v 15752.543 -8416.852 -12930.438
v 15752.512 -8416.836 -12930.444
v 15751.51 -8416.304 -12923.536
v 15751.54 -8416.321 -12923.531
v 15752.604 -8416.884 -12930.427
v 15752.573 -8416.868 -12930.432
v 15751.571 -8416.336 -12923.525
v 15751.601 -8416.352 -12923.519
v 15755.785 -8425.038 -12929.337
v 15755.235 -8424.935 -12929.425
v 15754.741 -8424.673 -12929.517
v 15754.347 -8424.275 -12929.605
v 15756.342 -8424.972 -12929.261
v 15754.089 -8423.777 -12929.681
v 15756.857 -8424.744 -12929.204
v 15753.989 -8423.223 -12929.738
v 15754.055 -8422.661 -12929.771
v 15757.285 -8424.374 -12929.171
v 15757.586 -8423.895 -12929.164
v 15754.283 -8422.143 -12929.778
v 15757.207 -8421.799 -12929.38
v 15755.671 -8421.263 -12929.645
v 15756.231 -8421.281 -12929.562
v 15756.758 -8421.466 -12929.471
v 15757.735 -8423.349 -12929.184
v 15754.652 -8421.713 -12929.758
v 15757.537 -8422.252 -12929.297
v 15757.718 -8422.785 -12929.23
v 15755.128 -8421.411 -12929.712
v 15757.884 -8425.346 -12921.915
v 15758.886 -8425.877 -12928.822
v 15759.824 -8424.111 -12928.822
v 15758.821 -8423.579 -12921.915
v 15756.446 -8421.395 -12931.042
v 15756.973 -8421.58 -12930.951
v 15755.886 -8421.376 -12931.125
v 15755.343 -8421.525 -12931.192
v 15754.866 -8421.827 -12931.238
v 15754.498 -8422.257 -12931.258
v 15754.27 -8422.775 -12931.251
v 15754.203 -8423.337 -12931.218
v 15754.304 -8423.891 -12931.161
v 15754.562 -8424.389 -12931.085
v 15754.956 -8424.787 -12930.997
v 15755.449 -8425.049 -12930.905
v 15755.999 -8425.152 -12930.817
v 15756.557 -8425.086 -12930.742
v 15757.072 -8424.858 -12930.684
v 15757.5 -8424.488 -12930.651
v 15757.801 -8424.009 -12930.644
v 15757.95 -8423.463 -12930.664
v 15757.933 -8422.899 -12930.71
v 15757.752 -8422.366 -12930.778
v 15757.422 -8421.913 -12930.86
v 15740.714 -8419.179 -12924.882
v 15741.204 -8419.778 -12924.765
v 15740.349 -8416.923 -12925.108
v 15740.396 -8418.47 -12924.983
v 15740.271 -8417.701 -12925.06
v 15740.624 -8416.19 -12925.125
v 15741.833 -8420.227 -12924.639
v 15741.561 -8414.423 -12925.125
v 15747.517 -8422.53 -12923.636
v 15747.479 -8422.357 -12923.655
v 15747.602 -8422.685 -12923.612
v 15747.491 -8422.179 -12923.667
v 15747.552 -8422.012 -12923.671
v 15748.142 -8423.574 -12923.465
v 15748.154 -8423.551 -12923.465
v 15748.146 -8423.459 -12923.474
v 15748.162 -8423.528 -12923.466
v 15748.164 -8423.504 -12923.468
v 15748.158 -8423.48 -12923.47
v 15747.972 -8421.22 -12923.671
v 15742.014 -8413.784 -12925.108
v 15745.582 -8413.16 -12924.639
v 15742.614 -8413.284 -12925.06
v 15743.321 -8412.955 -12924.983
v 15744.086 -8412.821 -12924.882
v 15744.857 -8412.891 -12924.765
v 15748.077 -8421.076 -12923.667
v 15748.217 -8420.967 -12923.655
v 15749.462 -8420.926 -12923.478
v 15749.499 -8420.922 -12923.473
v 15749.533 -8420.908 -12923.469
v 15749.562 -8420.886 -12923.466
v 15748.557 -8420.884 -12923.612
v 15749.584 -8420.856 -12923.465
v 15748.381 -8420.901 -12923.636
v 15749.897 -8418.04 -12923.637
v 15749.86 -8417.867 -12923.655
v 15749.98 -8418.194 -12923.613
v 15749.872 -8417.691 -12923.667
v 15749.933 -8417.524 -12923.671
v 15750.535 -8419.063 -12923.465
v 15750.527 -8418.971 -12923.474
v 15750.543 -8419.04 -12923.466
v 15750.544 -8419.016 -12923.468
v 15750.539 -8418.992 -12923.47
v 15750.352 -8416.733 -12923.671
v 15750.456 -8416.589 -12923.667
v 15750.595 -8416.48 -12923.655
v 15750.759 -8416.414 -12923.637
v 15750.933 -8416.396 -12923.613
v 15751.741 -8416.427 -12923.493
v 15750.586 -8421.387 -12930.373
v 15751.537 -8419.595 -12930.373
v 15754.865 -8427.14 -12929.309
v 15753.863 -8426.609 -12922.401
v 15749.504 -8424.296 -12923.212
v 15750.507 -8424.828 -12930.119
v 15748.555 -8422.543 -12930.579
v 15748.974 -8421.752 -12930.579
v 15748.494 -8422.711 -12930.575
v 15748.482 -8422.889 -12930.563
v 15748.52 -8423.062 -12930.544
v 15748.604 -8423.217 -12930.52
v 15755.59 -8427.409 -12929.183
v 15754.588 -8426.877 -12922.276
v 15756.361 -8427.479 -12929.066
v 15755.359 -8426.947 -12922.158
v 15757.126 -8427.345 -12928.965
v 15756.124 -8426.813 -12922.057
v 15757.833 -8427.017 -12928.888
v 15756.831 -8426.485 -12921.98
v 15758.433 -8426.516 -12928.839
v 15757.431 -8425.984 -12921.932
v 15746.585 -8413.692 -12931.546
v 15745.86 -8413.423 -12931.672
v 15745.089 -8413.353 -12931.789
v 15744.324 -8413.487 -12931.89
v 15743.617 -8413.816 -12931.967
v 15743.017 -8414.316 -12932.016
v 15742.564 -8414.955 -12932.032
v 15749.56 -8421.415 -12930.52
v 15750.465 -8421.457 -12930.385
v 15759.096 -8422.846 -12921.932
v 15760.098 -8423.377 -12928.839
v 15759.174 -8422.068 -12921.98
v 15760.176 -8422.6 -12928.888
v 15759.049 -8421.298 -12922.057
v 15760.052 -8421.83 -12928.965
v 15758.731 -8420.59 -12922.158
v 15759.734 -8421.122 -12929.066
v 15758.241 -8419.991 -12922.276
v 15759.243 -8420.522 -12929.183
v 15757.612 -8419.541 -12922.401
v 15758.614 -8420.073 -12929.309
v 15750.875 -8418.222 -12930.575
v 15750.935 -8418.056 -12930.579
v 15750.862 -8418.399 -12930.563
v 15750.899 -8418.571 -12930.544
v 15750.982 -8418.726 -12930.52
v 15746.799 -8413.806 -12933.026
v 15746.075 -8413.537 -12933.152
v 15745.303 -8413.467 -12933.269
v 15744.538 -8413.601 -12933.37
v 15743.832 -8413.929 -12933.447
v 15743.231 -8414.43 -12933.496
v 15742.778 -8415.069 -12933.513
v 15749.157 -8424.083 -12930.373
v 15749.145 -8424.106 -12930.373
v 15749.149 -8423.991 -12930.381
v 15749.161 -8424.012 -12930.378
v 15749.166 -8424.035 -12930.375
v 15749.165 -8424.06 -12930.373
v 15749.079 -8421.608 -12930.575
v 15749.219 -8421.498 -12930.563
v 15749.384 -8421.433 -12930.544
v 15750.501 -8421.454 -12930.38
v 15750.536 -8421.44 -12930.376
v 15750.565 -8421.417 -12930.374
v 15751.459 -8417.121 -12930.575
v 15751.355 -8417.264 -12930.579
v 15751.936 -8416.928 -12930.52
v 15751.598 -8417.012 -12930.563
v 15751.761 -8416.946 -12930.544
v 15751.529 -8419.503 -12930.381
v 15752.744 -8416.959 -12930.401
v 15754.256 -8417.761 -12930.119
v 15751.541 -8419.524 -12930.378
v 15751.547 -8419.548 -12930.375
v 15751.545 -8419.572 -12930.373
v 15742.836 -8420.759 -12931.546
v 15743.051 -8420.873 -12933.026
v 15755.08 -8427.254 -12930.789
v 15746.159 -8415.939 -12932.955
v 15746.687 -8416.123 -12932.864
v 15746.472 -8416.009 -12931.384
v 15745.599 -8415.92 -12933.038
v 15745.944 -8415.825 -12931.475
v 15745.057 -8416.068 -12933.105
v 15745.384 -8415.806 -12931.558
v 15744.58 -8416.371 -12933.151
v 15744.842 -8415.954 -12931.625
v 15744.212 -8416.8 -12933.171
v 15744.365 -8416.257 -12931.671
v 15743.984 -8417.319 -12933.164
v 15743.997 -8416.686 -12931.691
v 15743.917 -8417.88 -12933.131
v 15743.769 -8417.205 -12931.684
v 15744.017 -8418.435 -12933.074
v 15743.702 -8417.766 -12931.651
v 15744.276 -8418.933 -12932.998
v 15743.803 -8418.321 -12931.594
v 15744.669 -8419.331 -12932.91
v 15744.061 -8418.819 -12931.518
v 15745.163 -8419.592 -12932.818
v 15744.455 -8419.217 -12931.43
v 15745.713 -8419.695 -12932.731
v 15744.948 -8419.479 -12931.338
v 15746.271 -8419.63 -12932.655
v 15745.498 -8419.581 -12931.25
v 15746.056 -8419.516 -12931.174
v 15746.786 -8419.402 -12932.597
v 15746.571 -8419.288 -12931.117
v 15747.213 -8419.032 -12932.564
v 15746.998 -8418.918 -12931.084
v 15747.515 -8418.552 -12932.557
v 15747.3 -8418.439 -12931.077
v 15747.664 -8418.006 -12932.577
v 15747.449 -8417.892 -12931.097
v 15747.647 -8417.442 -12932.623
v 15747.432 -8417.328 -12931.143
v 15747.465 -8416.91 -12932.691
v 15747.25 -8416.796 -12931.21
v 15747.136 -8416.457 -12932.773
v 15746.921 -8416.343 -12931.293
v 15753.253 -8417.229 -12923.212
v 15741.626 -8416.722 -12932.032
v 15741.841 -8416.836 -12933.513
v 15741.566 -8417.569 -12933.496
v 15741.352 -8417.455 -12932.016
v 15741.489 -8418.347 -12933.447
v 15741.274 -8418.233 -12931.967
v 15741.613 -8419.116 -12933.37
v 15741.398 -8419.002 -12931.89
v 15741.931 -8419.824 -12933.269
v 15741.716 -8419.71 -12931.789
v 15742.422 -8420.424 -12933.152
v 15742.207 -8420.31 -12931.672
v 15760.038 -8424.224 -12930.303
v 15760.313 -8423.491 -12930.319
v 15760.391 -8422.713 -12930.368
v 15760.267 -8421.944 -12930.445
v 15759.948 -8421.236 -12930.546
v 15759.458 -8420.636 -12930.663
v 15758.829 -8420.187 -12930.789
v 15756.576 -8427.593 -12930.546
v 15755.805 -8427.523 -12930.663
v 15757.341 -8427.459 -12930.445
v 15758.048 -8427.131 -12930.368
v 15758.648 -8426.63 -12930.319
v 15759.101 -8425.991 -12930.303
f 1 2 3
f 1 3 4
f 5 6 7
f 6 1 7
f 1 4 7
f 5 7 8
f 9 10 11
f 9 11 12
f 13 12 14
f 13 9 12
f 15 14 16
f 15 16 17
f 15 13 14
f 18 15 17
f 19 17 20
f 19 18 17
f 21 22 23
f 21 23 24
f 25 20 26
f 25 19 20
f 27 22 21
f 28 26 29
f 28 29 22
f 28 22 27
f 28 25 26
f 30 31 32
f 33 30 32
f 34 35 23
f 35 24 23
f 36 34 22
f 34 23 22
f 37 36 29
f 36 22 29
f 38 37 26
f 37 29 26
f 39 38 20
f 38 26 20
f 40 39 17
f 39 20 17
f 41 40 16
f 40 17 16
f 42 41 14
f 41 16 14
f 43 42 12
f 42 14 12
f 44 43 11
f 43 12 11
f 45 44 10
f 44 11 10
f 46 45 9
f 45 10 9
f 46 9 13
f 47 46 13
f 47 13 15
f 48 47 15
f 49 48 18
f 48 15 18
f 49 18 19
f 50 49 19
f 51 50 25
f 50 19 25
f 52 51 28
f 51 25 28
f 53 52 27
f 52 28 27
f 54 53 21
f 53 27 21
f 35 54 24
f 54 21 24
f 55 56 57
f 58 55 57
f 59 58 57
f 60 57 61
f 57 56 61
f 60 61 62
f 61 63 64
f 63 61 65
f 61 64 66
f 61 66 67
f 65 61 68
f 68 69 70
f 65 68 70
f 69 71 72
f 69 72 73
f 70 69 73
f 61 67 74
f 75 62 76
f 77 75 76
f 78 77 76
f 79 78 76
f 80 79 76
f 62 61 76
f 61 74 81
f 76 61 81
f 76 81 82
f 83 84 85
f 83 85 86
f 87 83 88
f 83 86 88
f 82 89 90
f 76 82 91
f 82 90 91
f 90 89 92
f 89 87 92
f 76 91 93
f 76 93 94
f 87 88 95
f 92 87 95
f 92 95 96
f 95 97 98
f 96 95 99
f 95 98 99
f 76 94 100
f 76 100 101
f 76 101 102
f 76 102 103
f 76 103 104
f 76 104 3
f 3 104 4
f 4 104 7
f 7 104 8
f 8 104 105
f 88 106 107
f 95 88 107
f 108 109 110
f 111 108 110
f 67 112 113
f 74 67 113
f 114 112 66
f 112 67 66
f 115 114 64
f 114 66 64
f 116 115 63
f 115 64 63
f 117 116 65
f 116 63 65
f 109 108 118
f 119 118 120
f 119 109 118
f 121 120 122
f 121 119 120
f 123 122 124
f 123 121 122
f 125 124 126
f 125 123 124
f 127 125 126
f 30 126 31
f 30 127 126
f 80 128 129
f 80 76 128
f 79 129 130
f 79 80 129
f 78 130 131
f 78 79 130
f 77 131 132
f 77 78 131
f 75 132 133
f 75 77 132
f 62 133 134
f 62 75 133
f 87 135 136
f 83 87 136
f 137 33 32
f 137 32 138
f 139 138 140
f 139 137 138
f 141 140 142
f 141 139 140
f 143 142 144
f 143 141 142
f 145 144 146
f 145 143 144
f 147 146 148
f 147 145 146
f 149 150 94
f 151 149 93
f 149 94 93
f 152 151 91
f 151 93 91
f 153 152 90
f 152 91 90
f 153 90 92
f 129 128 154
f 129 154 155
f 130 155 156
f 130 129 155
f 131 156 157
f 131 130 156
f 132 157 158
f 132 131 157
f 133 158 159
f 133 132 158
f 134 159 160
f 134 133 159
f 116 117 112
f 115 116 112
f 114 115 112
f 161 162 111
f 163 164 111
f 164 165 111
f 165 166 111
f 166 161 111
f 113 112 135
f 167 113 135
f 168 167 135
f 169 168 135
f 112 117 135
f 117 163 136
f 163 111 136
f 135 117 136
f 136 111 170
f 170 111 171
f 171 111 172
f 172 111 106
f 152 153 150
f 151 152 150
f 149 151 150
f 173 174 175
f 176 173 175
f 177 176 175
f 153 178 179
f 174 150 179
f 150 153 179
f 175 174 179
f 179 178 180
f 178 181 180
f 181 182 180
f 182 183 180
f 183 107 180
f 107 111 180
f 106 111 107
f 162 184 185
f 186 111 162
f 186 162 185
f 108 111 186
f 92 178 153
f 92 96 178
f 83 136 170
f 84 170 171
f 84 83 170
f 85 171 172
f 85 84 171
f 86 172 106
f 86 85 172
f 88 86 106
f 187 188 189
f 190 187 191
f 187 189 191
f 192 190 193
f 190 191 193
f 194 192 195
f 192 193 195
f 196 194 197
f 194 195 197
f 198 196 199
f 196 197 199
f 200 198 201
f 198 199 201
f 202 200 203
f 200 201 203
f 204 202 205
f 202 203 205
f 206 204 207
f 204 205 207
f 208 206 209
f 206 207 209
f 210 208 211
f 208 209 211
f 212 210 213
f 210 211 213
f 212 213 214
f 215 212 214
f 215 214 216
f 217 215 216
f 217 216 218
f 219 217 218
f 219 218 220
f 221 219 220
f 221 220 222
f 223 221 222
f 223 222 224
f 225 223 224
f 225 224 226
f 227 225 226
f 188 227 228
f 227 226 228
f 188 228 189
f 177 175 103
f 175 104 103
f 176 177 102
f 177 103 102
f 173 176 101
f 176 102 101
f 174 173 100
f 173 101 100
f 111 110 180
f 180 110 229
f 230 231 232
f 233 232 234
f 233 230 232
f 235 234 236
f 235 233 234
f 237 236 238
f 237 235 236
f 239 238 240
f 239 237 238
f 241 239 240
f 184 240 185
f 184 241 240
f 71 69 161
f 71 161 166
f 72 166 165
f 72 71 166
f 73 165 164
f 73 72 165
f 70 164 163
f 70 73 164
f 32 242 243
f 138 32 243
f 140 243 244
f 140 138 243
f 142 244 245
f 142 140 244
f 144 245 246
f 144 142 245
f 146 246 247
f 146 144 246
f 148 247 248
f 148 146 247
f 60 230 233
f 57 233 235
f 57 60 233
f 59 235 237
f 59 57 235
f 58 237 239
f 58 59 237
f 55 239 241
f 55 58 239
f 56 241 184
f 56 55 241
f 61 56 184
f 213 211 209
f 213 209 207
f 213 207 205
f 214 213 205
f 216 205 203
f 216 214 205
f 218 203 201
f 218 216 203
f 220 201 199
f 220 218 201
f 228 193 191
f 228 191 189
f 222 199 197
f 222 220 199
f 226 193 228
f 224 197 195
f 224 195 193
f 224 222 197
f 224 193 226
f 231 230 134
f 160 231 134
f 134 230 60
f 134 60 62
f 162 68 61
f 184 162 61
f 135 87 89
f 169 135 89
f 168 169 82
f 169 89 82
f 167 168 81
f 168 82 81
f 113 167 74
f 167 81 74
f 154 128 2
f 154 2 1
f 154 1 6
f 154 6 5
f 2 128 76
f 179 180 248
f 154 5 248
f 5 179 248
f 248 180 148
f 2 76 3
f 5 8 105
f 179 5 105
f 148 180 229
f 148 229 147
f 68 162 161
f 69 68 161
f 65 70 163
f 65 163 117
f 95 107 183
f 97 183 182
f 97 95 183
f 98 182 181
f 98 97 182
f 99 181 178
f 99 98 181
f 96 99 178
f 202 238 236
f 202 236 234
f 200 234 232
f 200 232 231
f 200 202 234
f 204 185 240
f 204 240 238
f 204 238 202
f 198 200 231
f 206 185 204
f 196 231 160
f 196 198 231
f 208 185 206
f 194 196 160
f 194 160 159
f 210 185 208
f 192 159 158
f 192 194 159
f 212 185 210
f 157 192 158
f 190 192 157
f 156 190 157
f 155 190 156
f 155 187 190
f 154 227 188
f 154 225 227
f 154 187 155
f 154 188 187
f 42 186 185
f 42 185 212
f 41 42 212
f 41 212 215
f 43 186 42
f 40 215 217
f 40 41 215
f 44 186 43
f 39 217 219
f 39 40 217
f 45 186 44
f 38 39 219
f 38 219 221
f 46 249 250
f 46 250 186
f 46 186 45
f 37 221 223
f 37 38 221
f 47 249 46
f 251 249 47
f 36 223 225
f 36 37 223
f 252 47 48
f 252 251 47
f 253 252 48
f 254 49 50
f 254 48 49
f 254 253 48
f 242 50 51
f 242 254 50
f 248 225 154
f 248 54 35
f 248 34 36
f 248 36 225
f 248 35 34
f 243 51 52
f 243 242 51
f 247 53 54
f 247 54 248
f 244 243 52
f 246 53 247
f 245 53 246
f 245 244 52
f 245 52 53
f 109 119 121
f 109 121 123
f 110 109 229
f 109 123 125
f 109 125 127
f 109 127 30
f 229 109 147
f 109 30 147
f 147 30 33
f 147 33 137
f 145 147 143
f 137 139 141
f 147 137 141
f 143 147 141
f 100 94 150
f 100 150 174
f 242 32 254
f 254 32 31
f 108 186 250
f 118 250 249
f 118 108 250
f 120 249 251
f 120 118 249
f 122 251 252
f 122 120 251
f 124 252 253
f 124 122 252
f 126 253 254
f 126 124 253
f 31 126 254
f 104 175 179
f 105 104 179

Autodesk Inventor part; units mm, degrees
ref_plane "YZ Plane" through (0, 0, 0) normal (1, 0, 0) x (0, 1, 0)
ref_plane "XZ Plane" through (0, 0, 0) normal (0, 1, 0) x (-1, 0, 0)
ref_plane "Work Plane1" through (-367703.1992, 632830.1242, 533306.3882) normal (-0.7430322, 0.6187428, -0.2550695) x (0.5860721, 0.7855909, 0.1984099)
sketch "Sketch1" plane through (15736.2978, -8215.3634, -12939.6422) normal (-0.8717195, 0.4624093, -0.1621198) x (0.4686085, 0.883406, 0)
  circle A0 centre (-111.4493, -109512.2066) radius 1.9
  circle A1 centre (-105.9197, -109447.9073) radius 1.9
  line L0 (-1, 8.962) -> (1, 8.962)
  arc A2 (-4.0236, -0.3508) -> (-14, 8.962) centre (-14, -1.038) ccw
  arc A3 (-4, -7.838) -> (-1, -10.838) centre (-1, -7.838) ccw
  line L1 (-1, -10.838) -> (1, -10.838)
  arc A4 (1, -10.838) -> (4, -7.838) centre (1, -7.838) ccw
  line L2 (-6.0031, -0.3508) -> (-3.9739, -0.3508)
  line L3 (-421.5485, 0.712) -> (525.8715, 0.712)
  arc A5 (-3.6711, -0.5438) -> (-3.9739, -0.3508) centre (-3.9739, -0.685) ccw
  line L4 (-3.2429, -1.398) -> (-3.6711, -0.5438)
  arc A6 (-3.2429, -1.398) -> (-2.8963, -1.6208) centre (-2.8963, -1.2398) ccw
  line L5 (-2.0007, -1.6208) -> (-2.8963, -1.6208)
  arc A7 (-2.0007, -1.6208) -> (-1.6554, -1.4008) centre (-2.0007, -1.2398) ccw
  line L6 (-1.2684, -0.5708) -> (-1.6554, -1.4008)
  arc A8 (-0.9231, -0.3508) -> (-1.2684, -0.5708) centre (-0.9231, -0.7318) ccw
  line L7 (-0.9231, -0.3508) -> (1.1061, -0.3508)
  arc A9 (1.4089, -0.5438) -> (1.1061, -0.3508) centre (1.1061, -0.685) ccw
  line L8 (1.8384, -1.4008) -> (1.4089, -0.5438)
  arc A10 (1.8384, -1.4008) -> (2.1837, -1.6208) centre (2.1837, -1.2398) ccw
  line L9 (3.0793, -1.6208) -> (2.1837, -1.6208)
  arc A11 (3.0793, -1.6208) -> (3.4234, -1.4033) centre (3.0793, -1.2398) ccw
  line L10 (3.8551, -0.4948) -> (3.4234, -1.4033)
  arc A12 (4.1569, -0.304) -> (3.8551, -0.4948) centre (4.1569, -0.6382) ccw
  line L11 (4.1569, -0.304) -> (6.1861, -0.304)
  arc A13 (-1, 8.962) -> (-4, 5.962) centre (-1, 5.962) ccw
  arc A14 (4, 5.962) -> (1, 8.962) centre (1, 5.962) ccw
  line L12 (-4, -0.6008) -> (-3.9739, -0.6008)
  arc A15 (-3.8967, -0.6516) -> (-3.9739, -0.6008) centre (-3.9739, -0.685) ccw
  line L13 (-3.8967, -0.6516) -> (-3.4682, -1.5065)
  arc A16 (-3.4682, -1.5065) -> (-2.8963, -1.8708) centre (-2.8963, -1.2398) ccw
  line L14 (-2.8963, -1.8708) -> (-2.0007, -1.8708)
  arc A17 (-2.0007, -1.8708) -> (-1.4289, -1.5065) centre (-2.0007, -1.2398) ccw
  line L15 (-1.4289, -1.5065) -> (-1.0418, -0.6765)
  arc A18 (-0.9231, -0.6008) -> (-1.0418, -0.6765) centre (-0.9231, -0.7318) ccw
  line L16 (-0.9231, -0.6008) -> (1.1061, -0.6008)
  arc A19 (1.1833, -0.6516) -> (1.1061, -0.6008) centre (1.1061, -0.685) ccw
  line L17 (1.1833, -0.6516) -> (1.6135, -1.5101)
  arc A20 (1.6135, -1.5101) -> (2.1837, -1.8708) centre (2.1837, -1.2398) ccw
  line L18 (2.1837, -1.8708) -> (3.0793, -1.8708)
  arc A21 (3.0793, -1.8708) -> (3.6492, -1.5106) centre (3.0793, -1.2398) ccw
  line L19 (3.6492, -1.5106) -> (4, -0.7723)
  arc A22 (4.1569, -0.554) -> (4.0809, -0.602) centre (4.1569, -0.6382) ccw
  line L20 (4.1569, -0.554) -> (6.1861, -0.554)
  line L21 (-4, -0.6008) -> (-4, -7.838)
  line L22 (-4, 5.962) -> (-4, 0.962)
  line L23 (-4, 0.712) -> (-4, -0.3508)
  line L24 (-421.5485, 0.962) -> (-4.202, 0.962)
  line L25 (4, 0.962) -> (4, 5.962)
  arc A23 (14, 8.962) -> (4.025, -0.3311) centre (14, -1.038) ccw
  arc A24 (4.0005, -0.9335) -> (4, -1.038) centre (14, -1.038) ccw
  line L26 (4, -7.838) -> (4, -0.7723)
  line L27 (4, -0.3431) -> (4, 0.712)
  line L28 (-4, 0.962) -> (4, 0.962)
  line L29 (4.202, 0.962) -> (525.8715, 0.962)
  point P0 (-116.6614, -15646.3059)
  dimension "d0" = 3
  dimension "d2" = 3
  dimension "d3" = 0.25
extrude "Extrusion1" add sketch "Sketch1" along normal blind 7 contours L0 A14 L25 L28 L22 A13 | L21 L12 A15 L13 A16 L14 A17 L15 A18 L16 A19 L17 A20 L18 A21 L19 L26 A24 A4 L1 A3
sketch "Sketch2" plane through (15730.1957, -8212.1265, -12940.777) normal (-0.8717195, 0.4624093, -0.1621198) x (0.4686085, 0.883406, 0)
  circle A0 centre (0, 4.962) radius 1.9 projected
  line L0 (1, 8.962) -> (-1, 8.962) projected
  arc A1 (-1, 8.962) -> (-4, 5.962) centre (-1, 5.962) ccw projected
  line L1 (-4, 5.962) -> (-4, 0.962) projected
  line L2 (4, 0.962) -> (4, 5.962) projected
  arc A2 (4, 5.962) -> (1, 8.962) centre (1, 5.962) ccw projected
  circle A3 centre (0, -6.838) radius 1.9
  arc A4 (-4, -7.838) -> (-1, -10.838) centre (-1, -7.838) ccw
  line L3 (-1, -10.838) -> (1, -10.838)
  arc A5 (1, -10.838) -> (4, -7.838) centre (1, -7.838) ccw
  line L4 (4, -7.838) -> (4, -0.7723)
  line L5 (4, -0.7723) -> (4, 0.962)
  line L6 (-4, -7.838) -> (-4, 0.962)
  point P0 (-116.6614, -15646.3059)
extrude "Extrusion2" add sketch "Sketch2" along normal blind 1.5
move or copy body "Move Body1" bodies to move or copy 1 copy no rotation origin (0, 0, 0) rotation axis (-0.4686085, -0.883406, 0) rotation angle 90 translate (4249.9407, -2254.4088, -30671.5092)
move or copy body "Move Body2" bodies to move or copy 1 copy no translate (14.9738, 0, -3.187)
move or copy body "Move Body3" bodies to move or copy 1 copy no translate (0, -205.3427, 0)
move or copy body "Move Body4" bodies to move or copy 1 copy no translate (10, 0, 0)
move or copy body "Move Body5" bodies to move or copy 1 copy no translate (-10, 0, 0)
equation "\"d4\" = d3"
properties part number "belt-clamp"
